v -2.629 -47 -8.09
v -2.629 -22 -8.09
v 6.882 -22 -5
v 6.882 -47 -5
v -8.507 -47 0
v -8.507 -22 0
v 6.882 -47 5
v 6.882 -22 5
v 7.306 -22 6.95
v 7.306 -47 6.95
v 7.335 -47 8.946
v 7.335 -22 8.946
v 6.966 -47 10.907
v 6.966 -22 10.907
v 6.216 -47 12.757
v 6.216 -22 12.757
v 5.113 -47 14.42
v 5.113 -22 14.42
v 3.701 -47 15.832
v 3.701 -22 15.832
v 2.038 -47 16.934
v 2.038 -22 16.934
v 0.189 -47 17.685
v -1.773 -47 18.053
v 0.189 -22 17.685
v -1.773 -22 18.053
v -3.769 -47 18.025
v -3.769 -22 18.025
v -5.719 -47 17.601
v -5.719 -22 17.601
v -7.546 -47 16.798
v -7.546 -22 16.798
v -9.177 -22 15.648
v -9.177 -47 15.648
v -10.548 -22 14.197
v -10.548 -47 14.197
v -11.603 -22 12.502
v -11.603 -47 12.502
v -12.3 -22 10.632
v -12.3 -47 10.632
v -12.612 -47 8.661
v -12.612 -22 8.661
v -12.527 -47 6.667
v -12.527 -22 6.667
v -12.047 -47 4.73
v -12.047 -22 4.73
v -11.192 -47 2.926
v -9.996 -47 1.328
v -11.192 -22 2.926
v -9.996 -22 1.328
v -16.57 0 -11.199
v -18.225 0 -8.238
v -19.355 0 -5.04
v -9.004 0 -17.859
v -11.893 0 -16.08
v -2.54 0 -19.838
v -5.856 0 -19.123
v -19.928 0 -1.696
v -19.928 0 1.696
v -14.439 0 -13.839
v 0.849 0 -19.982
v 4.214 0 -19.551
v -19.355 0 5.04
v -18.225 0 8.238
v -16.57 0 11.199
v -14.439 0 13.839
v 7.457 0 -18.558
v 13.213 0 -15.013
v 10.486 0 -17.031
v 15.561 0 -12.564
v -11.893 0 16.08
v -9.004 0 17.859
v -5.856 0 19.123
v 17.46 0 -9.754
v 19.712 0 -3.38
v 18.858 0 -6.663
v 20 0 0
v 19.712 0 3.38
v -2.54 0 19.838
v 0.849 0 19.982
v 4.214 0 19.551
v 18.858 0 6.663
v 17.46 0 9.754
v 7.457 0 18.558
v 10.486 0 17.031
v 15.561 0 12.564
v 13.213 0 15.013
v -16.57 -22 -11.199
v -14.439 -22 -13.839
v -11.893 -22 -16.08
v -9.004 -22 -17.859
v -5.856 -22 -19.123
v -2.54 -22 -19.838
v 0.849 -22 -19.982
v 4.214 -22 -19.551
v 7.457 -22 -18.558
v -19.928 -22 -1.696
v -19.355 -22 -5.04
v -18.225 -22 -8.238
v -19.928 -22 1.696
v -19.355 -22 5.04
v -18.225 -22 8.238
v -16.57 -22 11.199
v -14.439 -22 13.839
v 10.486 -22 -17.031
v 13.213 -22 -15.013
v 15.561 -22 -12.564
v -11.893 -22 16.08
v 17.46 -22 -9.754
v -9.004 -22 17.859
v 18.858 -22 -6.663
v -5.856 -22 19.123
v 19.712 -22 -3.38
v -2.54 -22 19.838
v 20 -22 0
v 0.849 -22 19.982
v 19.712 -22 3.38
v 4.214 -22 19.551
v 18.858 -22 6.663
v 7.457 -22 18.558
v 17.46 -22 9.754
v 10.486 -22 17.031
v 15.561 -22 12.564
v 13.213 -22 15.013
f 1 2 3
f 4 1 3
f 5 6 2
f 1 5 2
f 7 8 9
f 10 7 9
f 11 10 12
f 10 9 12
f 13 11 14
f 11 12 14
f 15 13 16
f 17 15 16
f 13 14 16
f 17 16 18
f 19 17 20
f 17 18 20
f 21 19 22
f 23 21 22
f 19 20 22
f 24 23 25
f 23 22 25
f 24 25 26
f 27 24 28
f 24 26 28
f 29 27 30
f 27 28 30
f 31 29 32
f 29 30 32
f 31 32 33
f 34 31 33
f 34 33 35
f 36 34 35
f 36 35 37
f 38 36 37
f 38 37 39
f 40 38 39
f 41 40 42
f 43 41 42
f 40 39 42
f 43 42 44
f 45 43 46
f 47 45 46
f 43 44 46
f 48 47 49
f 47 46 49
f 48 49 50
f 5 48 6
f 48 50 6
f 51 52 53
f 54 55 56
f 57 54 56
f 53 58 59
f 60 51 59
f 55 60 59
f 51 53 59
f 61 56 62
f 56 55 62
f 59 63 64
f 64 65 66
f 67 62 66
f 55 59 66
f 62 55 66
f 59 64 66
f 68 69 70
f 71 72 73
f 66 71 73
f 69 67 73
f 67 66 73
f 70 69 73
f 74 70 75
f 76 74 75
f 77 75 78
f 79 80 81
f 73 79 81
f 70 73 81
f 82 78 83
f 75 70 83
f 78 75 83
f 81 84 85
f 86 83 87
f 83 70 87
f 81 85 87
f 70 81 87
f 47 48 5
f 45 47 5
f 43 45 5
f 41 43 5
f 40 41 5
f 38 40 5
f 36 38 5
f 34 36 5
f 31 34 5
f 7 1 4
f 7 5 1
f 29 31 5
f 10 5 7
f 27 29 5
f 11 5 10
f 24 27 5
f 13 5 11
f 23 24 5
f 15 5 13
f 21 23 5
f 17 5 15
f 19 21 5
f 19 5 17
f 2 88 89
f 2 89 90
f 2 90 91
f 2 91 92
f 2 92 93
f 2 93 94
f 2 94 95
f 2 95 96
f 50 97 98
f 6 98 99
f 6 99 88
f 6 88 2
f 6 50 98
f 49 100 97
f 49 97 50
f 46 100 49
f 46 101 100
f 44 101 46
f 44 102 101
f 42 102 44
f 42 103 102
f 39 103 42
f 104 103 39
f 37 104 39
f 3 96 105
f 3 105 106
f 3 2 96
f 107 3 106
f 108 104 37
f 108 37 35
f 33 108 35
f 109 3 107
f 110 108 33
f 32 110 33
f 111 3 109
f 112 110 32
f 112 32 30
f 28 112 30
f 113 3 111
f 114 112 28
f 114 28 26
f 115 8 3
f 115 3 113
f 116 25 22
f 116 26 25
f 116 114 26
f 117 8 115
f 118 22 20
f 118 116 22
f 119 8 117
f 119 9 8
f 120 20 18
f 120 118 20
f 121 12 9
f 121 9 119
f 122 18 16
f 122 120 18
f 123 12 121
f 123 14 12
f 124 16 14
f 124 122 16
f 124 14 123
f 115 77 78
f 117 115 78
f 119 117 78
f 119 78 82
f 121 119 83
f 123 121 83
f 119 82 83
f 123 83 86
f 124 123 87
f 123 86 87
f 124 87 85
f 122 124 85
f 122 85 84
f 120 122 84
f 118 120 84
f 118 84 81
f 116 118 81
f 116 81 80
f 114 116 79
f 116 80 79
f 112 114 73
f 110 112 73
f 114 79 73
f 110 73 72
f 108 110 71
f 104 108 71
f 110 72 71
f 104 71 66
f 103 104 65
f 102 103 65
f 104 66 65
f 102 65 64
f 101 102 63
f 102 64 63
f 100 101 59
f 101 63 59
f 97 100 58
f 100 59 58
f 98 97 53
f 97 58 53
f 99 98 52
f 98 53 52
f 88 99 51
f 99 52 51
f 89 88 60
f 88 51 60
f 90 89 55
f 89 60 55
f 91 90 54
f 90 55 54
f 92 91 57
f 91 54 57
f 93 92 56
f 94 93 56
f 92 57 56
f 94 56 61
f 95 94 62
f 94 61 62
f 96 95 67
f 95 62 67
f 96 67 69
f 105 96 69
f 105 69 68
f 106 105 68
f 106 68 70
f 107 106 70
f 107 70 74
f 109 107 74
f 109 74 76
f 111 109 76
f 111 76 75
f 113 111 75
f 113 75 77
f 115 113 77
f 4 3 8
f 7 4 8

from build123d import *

# Parameters (mm, degrees)
F0_R     = 20
F1_DEPTH = 22
F3_DEPTH = 25
F4_W     = 10
F4_H     = 25


with BuildPart() as f1:
    # F0 (on Front) → F1 (new body)
    with BuildSketch(Plane.XZ):
        Circle(F0_R)
    extrude(amount=F1_DEPTH)

    # F2 (on face) → F3 (join)
    with BuildSketch(Plane.XZ.offset(22)):
        Polygon((6.8819096024, -5), (6.8819096024, 5), (-2.6286555606, 8.0901699437), (-8.5065080835, 0), (-2.6286555606, -8.0901699437), align=None)
    extrude(amount=F3_DEPTH)

    # F4 (on face) → F5 (revolve)
    with BuildSketch(Plane(origin=(2.1266270209, 0, 6.5450849719), x_dir=(0.9510565163, 0, -0.3090169944), z_dir=(0.3090169944, 0, 0.9510565163))):
        with Locations((0, -34.5)):
            Rectangle(F4_W, F4_H)
    revolve(axis=Axis((-2.6286555606, -34.5, 8.0901699437), (0, -1, 0)))


solid = f1.part
